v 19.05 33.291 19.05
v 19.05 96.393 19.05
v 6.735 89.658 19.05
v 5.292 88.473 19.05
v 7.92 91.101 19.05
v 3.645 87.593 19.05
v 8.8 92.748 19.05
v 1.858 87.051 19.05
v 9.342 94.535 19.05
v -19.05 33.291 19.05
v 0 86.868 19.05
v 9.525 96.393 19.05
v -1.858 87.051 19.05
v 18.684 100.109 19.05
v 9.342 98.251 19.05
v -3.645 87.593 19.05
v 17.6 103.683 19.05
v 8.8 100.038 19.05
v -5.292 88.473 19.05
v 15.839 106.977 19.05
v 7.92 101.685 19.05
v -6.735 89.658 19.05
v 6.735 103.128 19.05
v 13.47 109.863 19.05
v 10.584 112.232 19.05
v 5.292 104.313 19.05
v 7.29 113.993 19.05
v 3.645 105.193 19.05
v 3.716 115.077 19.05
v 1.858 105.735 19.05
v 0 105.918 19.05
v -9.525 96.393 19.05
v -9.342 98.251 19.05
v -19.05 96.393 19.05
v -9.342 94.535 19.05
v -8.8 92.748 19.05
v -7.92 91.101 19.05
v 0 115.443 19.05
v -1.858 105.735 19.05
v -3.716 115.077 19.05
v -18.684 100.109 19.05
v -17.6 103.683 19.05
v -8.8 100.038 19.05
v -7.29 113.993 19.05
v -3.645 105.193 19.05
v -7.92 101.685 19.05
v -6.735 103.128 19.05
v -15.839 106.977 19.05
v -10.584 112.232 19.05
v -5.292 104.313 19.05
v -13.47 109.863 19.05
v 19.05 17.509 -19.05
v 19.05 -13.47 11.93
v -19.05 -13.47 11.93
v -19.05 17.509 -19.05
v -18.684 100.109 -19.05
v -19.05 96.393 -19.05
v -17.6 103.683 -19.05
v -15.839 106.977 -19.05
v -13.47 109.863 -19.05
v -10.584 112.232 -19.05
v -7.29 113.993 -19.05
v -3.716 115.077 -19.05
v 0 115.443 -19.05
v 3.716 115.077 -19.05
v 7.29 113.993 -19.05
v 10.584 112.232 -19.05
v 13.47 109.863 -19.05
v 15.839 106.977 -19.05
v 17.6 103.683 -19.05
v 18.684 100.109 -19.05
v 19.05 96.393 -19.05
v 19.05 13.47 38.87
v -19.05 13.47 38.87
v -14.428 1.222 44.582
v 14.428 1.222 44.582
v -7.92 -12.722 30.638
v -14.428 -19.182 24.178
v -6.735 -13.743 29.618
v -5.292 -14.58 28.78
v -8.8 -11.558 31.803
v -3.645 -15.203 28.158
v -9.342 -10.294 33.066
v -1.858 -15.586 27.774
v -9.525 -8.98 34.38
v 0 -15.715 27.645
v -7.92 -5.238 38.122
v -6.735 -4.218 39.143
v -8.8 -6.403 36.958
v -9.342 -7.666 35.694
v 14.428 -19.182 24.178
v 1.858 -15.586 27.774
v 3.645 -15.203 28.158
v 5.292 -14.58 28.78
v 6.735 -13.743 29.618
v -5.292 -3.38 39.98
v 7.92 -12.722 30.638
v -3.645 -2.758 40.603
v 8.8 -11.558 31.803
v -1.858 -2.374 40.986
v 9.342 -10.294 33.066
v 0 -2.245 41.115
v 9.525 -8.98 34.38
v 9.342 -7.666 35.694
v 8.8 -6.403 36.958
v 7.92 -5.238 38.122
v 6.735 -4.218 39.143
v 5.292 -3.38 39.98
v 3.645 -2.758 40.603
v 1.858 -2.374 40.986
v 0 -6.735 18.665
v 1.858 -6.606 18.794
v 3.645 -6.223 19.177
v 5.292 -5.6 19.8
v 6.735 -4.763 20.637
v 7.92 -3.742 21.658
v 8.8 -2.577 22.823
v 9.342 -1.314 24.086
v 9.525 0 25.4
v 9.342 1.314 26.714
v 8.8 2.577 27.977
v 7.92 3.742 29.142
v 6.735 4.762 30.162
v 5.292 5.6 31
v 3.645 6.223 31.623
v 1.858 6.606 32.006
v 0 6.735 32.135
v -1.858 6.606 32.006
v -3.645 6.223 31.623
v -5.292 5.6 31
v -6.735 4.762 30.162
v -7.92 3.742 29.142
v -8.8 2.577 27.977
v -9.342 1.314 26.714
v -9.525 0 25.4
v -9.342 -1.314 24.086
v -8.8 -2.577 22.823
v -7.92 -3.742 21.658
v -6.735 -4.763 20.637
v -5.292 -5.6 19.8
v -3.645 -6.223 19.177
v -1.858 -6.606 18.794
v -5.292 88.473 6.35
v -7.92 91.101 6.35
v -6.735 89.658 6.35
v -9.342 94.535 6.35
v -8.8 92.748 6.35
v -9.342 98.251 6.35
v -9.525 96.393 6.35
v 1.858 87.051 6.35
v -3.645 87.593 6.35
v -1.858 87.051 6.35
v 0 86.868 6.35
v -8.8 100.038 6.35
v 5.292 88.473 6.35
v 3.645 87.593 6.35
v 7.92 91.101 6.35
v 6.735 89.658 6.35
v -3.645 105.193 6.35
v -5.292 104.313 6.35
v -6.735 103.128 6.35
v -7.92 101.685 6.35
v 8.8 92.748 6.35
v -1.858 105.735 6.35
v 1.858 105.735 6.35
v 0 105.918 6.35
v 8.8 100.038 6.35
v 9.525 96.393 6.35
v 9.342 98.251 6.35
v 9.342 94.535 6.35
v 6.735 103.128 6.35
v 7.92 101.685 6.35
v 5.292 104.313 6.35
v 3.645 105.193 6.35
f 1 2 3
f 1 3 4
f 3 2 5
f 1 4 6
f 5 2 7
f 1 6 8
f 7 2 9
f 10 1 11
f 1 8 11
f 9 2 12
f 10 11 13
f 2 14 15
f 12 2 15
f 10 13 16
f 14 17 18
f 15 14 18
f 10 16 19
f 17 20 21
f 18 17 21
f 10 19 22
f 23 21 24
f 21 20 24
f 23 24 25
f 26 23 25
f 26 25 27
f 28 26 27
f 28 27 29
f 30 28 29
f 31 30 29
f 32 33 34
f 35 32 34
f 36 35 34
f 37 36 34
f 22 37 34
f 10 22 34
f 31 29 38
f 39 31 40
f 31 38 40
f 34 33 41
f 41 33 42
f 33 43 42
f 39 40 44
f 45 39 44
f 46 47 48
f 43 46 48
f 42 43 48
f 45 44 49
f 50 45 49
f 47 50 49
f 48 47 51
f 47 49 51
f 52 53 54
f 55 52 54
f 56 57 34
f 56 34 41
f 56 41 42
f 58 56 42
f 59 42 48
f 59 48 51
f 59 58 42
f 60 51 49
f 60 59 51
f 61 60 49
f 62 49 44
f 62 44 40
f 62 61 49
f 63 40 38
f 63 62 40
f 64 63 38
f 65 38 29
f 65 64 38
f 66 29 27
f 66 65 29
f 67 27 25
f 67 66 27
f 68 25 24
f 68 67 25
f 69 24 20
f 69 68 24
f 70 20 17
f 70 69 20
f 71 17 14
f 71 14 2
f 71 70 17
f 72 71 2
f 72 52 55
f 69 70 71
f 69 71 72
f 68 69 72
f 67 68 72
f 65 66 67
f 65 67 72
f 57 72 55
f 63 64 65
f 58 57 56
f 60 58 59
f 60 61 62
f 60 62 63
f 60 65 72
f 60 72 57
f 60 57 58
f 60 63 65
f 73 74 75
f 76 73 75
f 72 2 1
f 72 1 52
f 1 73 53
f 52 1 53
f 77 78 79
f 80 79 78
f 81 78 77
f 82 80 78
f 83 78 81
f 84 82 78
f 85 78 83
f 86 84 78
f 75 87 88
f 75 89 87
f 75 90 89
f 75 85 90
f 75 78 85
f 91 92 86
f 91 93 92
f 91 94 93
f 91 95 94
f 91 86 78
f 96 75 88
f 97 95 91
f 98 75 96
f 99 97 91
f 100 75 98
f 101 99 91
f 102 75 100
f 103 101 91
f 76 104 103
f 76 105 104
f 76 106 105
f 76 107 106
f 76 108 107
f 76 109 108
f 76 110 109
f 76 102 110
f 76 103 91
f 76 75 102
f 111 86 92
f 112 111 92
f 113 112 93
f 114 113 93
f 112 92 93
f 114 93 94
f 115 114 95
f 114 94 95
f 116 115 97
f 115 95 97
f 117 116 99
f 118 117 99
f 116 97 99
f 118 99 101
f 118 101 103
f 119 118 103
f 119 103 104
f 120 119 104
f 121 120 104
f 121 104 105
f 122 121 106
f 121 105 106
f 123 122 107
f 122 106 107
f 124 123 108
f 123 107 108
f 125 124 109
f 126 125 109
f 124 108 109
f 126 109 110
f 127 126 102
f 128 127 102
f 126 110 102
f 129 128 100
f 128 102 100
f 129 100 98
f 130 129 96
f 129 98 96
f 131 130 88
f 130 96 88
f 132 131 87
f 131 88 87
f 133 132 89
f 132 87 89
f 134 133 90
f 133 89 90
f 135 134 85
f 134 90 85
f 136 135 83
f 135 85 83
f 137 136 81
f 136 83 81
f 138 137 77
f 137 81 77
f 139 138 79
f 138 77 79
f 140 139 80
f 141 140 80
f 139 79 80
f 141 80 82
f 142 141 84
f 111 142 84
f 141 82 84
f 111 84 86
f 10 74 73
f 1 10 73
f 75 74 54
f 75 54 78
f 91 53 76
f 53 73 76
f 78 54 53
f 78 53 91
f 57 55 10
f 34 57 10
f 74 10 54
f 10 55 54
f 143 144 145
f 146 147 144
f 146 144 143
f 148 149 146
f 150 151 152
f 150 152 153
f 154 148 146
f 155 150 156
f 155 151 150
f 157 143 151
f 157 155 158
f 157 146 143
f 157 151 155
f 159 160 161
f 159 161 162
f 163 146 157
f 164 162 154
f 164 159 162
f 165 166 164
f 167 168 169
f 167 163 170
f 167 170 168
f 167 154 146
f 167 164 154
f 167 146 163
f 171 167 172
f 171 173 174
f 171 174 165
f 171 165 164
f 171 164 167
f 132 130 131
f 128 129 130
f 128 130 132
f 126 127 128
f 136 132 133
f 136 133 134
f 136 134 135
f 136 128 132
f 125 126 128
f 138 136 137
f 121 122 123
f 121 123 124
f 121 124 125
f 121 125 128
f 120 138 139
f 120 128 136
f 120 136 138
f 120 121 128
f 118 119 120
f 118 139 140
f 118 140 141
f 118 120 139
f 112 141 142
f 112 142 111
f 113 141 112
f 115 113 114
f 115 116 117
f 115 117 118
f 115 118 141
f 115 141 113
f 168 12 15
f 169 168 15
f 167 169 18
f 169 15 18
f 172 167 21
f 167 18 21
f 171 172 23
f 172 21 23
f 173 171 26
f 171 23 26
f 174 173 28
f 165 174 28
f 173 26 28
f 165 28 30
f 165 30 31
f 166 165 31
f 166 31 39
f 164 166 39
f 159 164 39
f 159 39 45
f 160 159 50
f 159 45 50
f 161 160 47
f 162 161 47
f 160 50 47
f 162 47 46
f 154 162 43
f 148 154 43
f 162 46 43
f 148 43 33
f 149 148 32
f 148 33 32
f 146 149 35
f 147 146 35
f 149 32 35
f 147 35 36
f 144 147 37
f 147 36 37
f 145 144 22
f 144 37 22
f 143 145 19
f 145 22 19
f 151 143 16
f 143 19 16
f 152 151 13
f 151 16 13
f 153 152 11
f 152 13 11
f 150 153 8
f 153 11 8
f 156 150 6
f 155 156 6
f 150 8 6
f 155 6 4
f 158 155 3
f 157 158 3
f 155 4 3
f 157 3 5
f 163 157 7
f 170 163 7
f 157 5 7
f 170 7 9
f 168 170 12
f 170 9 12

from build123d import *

# Parameters (mm, degrees)
SKETCH11_W          = 38.1
SKETCH11_H          = 38.1
SKETCH12_W          = 38.1
SKETCH12_H          = 38.1
BOSS_EXTRUDE5_DEPTH = 12.7
BOSS_EXTRUDE5_TAPER = 20
BOSS_EXTRUDE6_DEPTH = 38.1
SKETCH14_R          = 9.525
CUT_EXTRUDE2_DEPTH  = 12.7
SKETCH15_R          = 9.525
CUT_EXTRUDE3_DEPTH  = 12.7


with BuildPart() as part:
    # Sweep1: sweep along a path in Sketch10
    with BuildLine(Plane(origin=(0, 0, 0), x_dir=(0, 0, -1), z_dir=(1, 0, 0))) as sweep1_path:
        Line((0, 96.393), (0, 25.4))
        Line((0, 25.4), (-25.4, 0))
    # Sketch11 → Sweep1 (sweep)
    with BuildSketch(Plane(origin=(0, 96.393, 0), x_dir=(1, 0, 0), z_dir=(0, 1, 0))):
        Rectangle(SKETCH11_W, SKETCH11_H)
    sweep(path=sweep1_path.line, transition=Transition.RIGHT)

    # Sketch12 → Boss-Extrude5 (add)
    with BuildSketch(Plane(origin=(0, -12.7, 12.7), x_dir=(1, 0, 0), z_dir=(0, -0.7071067811865461, 0.7071067811865489))):
        with Locations((0, 17.960512242)):
            Rectangle(SKETCH12_W, SKETCH12_H)
    extrude(amount=BOSS_EXTRUDE5_DEPTH, taper=BOSS_EXTRUDE5_TAPER)

    # Sketch13 → Boss-Extrude6 (add)
    with BuildSketch(Plane(origin=(0, 0, -19.05), x_dir=(-1, 0, 0), z_dir=(0, 0, -1))):
        with BuildLine():
            Line((-19.05, 96.393), (19.05, 96.393))
            ThreePointArc((19.05, 96.393), (0, 115.443), (-19.05, 96.393))
        make_face()
    extrude(amount=-BOSS_EXTRUDE6_DEPTH)

    # Sketch14 → Cut-Extrude2 (cut)
    with BuildSketch(Plane.XY.offset(19.05)):
        with Locations((0, 96.393)):
            Circle(SKETCH14_R)
    extrude(amount=-CUT_EXTRUDE2_DEPTH, mode=Mode.SUBTRACT)

    # Sketch15 → Cut-Extrude3 (cut)
    with BuildSketch(Plane(origin=(0, -21.680256121, 21.680256121), x_dir=(1, 0, 0), z_dir=(0, -0.7071067811865461, 0.7071067811865489))):
        with Locations(Location((0, 17.960512242, 0), (0, 0, 270))):
            Circle(SKETCH15_R)
    extrude(amount=-CUT_EXTRUDE3_DEPTH, mode=Mode.SUBTRACT)


solid = part.part
